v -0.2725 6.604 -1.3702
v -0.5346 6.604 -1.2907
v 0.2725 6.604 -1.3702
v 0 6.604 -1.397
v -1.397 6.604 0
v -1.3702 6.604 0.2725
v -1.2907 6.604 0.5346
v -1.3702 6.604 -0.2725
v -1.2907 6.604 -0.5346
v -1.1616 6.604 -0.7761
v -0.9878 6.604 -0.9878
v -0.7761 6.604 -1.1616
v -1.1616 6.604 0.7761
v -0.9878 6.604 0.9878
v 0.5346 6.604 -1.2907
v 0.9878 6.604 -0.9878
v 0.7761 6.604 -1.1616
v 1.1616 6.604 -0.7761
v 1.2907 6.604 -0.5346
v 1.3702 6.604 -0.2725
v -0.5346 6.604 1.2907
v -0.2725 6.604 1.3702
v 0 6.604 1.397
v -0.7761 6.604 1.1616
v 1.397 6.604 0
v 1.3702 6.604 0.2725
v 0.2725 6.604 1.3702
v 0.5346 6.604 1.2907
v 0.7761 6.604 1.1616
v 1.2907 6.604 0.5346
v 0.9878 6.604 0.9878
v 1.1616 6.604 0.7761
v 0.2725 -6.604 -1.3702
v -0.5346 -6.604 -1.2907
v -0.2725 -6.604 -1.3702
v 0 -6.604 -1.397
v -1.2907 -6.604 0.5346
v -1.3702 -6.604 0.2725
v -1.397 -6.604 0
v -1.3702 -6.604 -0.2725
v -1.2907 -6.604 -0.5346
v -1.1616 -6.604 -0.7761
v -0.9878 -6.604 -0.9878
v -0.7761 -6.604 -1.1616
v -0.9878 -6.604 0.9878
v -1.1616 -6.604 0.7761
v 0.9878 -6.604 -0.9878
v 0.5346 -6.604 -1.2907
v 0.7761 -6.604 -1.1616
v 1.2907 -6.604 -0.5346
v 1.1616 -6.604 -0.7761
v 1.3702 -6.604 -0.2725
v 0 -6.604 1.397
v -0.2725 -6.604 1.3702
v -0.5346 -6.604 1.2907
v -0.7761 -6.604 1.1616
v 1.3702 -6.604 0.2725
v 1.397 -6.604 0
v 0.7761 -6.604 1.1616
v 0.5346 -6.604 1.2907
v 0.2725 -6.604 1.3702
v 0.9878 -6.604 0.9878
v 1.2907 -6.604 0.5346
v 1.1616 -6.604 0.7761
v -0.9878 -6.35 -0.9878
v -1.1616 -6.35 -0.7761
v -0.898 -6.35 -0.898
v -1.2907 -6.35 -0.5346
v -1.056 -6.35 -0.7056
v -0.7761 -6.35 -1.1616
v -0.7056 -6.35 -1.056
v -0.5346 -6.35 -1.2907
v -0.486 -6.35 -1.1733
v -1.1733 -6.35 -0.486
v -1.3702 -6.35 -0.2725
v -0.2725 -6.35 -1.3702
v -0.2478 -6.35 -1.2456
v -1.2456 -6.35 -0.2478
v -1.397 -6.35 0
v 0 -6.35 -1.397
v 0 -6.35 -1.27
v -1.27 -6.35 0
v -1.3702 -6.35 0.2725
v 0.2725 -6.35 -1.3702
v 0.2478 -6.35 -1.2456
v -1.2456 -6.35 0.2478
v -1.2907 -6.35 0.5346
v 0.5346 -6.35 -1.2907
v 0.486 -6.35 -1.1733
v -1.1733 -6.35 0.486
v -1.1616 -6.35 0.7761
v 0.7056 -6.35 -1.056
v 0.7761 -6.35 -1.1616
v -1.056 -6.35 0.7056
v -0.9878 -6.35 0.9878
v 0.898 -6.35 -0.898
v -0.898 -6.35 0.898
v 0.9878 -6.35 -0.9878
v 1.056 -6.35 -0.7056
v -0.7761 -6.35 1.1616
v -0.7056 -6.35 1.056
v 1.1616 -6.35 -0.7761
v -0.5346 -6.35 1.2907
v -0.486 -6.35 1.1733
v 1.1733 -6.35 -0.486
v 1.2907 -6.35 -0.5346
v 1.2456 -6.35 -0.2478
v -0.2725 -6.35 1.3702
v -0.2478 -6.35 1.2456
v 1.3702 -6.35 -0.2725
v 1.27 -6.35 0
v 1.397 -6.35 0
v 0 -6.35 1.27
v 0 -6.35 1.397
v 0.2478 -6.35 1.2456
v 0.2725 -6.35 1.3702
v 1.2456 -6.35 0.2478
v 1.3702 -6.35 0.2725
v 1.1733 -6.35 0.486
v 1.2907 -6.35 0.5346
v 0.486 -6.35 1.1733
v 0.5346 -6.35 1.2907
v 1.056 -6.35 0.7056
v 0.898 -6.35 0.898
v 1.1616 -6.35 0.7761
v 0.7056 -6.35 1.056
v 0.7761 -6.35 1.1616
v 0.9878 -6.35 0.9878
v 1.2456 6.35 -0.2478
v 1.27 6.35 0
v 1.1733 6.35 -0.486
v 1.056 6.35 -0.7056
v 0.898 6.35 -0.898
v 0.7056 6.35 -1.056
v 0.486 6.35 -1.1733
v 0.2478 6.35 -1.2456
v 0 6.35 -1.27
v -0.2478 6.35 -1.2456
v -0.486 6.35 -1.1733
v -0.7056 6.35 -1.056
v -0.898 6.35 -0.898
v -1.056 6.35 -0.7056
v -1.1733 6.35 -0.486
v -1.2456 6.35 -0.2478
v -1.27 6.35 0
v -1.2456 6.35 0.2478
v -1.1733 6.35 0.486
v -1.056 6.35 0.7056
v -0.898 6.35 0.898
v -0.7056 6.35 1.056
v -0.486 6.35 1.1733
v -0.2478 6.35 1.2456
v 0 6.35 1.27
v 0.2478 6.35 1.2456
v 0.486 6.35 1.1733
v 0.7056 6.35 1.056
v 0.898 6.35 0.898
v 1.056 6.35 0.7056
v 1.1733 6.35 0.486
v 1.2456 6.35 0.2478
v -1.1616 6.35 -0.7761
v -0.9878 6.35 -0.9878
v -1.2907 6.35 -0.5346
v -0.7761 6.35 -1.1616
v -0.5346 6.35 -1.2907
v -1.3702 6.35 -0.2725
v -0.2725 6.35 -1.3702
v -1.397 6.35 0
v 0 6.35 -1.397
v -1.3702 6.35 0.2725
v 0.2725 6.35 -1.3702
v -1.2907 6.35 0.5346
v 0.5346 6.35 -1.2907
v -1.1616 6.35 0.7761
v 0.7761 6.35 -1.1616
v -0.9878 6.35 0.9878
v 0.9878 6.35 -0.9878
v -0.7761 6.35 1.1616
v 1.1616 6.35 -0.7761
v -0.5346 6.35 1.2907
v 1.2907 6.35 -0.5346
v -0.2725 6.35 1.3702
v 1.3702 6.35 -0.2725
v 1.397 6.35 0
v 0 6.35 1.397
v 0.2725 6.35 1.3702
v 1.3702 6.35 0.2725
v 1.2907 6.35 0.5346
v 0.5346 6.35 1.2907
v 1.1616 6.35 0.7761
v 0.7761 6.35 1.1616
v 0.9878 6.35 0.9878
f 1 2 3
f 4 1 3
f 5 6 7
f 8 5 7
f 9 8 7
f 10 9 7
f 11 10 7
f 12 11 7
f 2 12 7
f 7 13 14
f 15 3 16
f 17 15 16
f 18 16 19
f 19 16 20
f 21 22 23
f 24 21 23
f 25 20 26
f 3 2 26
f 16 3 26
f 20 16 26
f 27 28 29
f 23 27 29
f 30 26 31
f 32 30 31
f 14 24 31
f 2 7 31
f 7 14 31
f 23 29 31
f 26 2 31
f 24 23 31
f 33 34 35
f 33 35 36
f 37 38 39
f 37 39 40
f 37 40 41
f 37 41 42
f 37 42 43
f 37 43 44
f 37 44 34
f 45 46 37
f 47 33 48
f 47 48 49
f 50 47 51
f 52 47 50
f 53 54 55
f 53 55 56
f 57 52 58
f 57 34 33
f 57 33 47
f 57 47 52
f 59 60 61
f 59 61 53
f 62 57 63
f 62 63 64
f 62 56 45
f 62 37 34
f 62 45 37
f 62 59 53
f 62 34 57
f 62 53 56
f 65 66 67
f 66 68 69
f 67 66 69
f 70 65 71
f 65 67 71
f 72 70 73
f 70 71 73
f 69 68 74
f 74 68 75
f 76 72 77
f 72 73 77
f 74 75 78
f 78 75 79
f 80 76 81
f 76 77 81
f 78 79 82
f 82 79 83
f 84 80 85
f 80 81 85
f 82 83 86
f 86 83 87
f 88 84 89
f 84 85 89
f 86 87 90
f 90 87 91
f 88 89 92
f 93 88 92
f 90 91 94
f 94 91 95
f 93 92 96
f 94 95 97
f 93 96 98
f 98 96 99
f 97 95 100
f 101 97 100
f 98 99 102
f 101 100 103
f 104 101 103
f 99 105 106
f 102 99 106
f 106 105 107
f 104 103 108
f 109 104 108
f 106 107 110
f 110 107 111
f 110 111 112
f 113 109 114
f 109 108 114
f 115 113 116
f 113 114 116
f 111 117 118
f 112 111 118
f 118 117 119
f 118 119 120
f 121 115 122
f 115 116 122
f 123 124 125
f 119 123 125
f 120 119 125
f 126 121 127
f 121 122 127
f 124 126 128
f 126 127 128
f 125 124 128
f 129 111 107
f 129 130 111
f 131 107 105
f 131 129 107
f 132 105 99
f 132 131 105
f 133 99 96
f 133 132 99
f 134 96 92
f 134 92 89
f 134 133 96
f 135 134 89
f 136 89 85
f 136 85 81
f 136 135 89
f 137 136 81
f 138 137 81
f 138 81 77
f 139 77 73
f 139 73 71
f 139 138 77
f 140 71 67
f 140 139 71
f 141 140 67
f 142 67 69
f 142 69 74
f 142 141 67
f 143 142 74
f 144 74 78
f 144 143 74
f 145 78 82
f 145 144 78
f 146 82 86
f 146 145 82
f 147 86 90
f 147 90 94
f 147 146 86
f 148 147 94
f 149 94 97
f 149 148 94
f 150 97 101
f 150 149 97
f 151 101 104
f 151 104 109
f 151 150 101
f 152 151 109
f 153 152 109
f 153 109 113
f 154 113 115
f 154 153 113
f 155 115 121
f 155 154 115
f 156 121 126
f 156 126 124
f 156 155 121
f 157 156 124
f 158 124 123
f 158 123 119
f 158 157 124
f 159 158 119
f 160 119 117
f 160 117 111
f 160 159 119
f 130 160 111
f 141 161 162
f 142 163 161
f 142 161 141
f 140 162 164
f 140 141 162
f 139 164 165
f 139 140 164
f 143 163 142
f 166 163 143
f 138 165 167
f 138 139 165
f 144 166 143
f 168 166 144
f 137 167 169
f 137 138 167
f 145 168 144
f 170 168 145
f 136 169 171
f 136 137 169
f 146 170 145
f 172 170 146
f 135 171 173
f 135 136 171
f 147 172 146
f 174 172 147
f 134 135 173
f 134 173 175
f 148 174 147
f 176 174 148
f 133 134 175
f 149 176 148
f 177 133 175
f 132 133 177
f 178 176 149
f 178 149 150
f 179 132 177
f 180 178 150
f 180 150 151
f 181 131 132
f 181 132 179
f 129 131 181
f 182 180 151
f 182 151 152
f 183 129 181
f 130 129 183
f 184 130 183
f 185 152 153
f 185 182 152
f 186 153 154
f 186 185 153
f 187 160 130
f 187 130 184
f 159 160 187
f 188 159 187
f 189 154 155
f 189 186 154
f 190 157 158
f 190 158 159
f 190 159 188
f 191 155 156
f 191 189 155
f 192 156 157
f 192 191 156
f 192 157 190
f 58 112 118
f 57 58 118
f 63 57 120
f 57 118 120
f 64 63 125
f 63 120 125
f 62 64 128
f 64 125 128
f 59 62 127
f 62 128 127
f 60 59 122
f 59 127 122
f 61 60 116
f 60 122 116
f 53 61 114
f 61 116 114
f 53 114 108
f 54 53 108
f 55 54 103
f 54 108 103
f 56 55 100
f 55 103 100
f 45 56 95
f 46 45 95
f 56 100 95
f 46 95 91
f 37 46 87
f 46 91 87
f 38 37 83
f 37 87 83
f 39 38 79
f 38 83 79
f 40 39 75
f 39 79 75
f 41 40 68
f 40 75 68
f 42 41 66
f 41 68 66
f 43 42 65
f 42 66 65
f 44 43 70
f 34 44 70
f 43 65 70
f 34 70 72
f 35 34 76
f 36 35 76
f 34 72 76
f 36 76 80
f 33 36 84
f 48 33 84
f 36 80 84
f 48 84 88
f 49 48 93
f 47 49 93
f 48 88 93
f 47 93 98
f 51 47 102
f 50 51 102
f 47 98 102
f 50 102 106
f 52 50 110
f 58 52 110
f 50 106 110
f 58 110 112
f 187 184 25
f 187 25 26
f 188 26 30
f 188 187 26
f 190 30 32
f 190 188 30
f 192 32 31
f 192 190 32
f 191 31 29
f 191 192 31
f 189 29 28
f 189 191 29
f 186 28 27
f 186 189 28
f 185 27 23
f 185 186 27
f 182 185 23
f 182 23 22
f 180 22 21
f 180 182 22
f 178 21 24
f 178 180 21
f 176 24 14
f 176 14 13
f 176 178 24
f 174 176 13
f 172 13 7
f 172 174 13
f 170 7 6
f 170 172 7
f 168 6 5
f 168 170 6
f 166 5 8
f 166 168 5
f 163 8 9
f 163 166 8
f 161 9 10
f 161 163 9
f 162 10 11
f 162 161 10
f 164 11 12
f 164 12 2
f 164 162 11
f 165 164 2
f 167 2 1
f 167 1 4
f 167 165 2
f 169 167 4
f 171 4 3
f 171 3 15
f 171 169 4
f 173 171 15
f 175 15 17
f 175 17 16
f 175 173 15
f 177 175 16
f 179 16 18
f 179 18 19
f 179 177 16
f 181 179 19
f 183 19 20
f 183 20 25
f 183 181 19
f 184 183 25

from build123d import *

# Parameters (mm, degrees)
SKETCH1_R           = 1.27
BOSS_EXTRUDE1_DEPTH = 6.35
SKETCH2_R           = 1.397
BOSS_EXTRUDE2_DEPTH = 0.254


with BuildPart() as part:
    # Sketch1 → Boss-Extrude1 (new body, symmetric)
    with BuildSketch(Plane(origin=(0, 0, 0), x_dir=(1, 0, 0), z_dir=(0, 1, 0))):
        Circle(SKETCH1_R)
    extrude(amount=BOSS_EXTRUDE1_DEPTH, both=True)

    # Sketch2 → Boss-Extrude2 (add)
    with BuildSketch(Plane.XZ.offset(6.35)):
        Circle(SKETCH2_R)
    boss_extrude2 = extrude(amount=BOSS_EXTRUDE2_DEPTH)

    # Mirror1: Boss-Extrude2 across plane
    add(boss_extrude2.mirror(Plane.ZX))


solid = part.part
